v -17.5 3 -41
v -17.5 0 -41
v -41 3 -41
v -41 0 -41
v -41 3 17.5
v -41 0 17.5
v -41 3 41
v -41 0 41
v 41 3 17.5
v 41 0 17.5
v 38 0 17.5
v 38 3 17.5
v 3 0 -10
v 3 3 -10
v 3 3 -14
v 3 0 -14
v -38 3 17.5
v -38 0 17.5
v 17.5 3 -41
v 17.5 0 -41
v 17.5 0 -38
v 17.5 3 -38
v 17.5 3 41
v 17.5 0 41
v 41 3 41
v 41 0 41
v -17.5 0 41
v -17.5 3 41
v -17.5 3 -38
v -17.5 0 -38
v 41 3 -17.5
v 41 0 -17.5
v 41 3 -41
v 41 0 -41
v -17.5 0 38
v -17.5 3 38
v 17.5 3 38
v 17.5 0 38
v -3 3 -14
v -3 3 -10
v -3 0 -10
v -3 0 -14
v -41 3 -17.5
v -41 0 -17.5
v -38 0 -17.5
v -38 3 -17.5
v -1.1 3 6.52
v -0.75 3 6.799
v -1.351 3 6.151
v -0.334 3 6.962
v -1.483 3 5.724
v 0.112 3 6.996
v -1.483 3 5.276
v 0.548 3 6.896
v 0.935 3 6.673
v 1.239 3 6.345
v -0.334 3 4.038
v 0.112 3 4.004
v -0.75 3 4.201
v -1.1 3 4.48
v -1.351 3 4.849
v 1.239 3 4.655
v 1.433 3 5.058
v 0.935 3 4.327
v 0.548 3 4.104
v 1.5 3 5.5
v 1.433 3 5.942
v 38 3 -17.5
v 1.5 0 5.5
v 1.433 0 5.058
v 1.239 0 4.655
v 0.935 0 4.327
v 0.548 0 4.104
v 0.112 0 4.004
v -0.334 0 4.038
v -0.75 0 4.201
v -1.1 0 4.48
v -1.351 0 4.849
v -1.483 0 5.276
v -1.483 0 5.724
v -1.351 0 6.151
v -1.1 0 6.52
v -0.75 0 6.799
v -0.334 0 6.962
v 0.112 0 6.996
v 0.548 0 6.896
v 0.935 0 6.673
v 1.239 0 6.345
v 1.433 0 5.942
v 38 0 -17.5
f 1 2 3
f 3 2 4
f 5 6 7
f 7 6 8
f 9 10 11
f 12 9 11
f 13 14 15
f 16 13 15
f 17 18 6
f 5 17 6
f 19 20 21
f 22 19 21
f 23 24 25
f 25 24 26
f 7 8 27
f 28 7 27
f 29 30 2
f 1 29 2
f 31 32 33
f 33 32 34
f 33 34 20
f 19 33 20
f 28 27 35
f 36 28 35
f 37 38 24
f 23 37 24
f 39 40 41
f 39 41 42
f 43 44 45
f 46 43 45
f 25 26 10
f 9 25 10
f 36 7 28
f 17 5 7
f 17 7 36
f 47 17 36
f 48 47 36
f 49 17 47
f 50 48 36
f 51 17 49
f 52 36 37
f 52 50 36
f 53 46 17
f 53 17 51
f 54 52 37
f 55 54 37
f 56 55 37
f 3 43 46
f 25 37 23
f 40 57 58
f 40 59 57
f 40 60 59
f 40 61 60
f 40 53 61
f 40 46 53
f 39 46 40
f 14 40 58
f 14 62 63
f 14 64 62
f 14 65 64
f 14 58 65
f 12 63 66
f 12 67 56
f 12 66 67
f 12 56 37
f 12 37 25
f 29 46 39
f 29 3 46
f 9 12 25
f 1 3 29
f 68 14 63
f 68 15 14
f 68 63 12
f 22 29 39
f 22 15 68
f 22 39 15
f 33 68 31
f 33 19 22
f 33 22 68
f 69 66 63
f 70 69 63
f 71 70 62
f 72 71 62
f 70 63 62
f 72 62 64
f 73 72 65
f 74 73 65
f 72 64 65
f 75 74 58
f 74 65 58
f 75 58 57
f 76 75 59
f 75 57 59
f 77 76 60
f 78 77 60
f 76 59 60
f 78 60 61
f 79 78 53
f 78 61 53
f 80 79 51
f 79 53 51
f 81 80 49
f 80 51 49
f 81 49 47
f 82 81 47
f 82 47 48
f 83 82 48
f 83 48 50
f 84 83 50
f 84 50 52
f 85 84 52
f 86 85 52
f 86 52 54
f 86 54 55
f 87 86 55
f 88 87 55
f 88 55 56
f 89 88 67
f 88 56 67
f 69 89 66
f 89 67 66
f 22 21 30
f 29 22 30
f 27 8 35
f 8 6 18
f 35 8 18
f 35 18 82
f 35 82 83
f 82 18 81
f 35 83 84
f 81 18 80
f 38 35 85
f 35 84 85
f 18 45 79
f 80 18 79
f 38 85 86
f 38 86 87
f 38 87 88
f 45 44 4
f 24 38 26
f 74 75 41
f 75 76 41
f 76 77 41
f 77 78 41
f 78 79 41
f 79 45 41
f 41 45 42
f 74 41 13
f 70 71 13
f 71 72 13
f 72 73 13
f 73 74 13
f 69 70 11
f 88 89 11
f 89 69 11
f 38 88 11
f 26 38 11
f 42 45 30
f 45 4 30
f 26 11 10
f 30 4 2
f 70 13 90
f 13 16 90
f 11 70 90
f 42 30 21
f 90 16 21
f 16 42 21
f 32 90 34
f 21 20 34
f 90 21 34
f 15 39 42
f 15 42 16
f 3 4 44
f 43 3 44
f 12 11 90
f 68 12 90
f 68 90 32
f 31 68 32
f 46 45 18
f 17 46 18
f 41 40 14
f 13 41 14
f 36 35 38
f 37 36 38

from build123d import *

# Parameters (mm, degrees)
BOSS_EXTRUDE1_DEPTH = 3
SKETCH2_R           = 1.5
SKETCH2_W           = 6
SKETCH2_H           = 4
CUT_EXTRUDE1_DEPTH  = 3


with BuildPart() as part:
    # Sketch1 → Boss-Extrude1 (new body)
    with BuildSketch(Plane(origin=(0, 0, 0), x_dir=(1, 0, 0), z_dir=(0, 1, 0))):
        Polygon((-41, -41), (-17.5, -41), (-17.5, -38), (17.5, -38), (17.5, -41), (41, -41), (41, -17.5), (38, -17.5), (38, 17.5), (41, 17.5), (41, 41), (17.5, 41), (17.5, 38), (-17.5, 38), (-17.5, 41), (-41, 41), (-41, 17.5), (-38, 17.5), (-38, -17.5), (-41, -17.5), align=None)
    extrude(amount=BOSS_EXTRUDE1_DEPTH)

    # Sketch2 → Cut-Extrude1 (cut)
    with BuildSketch(Plane(origin=(0, 3, 0), x_dir=(1, 0, 0), z_dir=(0, 1, 0))):
        with Locations((0, -5.5)):
            Circle(SKETCH2_R)
        with Locations((0, 12)):
            Rectangle(SKETCH2_W, SKETCH2_H)
    extrude(amount=-CUT_EXTRUDE1_DEPTH, mode=Mode.SUBTRACT)


solid = part.part
